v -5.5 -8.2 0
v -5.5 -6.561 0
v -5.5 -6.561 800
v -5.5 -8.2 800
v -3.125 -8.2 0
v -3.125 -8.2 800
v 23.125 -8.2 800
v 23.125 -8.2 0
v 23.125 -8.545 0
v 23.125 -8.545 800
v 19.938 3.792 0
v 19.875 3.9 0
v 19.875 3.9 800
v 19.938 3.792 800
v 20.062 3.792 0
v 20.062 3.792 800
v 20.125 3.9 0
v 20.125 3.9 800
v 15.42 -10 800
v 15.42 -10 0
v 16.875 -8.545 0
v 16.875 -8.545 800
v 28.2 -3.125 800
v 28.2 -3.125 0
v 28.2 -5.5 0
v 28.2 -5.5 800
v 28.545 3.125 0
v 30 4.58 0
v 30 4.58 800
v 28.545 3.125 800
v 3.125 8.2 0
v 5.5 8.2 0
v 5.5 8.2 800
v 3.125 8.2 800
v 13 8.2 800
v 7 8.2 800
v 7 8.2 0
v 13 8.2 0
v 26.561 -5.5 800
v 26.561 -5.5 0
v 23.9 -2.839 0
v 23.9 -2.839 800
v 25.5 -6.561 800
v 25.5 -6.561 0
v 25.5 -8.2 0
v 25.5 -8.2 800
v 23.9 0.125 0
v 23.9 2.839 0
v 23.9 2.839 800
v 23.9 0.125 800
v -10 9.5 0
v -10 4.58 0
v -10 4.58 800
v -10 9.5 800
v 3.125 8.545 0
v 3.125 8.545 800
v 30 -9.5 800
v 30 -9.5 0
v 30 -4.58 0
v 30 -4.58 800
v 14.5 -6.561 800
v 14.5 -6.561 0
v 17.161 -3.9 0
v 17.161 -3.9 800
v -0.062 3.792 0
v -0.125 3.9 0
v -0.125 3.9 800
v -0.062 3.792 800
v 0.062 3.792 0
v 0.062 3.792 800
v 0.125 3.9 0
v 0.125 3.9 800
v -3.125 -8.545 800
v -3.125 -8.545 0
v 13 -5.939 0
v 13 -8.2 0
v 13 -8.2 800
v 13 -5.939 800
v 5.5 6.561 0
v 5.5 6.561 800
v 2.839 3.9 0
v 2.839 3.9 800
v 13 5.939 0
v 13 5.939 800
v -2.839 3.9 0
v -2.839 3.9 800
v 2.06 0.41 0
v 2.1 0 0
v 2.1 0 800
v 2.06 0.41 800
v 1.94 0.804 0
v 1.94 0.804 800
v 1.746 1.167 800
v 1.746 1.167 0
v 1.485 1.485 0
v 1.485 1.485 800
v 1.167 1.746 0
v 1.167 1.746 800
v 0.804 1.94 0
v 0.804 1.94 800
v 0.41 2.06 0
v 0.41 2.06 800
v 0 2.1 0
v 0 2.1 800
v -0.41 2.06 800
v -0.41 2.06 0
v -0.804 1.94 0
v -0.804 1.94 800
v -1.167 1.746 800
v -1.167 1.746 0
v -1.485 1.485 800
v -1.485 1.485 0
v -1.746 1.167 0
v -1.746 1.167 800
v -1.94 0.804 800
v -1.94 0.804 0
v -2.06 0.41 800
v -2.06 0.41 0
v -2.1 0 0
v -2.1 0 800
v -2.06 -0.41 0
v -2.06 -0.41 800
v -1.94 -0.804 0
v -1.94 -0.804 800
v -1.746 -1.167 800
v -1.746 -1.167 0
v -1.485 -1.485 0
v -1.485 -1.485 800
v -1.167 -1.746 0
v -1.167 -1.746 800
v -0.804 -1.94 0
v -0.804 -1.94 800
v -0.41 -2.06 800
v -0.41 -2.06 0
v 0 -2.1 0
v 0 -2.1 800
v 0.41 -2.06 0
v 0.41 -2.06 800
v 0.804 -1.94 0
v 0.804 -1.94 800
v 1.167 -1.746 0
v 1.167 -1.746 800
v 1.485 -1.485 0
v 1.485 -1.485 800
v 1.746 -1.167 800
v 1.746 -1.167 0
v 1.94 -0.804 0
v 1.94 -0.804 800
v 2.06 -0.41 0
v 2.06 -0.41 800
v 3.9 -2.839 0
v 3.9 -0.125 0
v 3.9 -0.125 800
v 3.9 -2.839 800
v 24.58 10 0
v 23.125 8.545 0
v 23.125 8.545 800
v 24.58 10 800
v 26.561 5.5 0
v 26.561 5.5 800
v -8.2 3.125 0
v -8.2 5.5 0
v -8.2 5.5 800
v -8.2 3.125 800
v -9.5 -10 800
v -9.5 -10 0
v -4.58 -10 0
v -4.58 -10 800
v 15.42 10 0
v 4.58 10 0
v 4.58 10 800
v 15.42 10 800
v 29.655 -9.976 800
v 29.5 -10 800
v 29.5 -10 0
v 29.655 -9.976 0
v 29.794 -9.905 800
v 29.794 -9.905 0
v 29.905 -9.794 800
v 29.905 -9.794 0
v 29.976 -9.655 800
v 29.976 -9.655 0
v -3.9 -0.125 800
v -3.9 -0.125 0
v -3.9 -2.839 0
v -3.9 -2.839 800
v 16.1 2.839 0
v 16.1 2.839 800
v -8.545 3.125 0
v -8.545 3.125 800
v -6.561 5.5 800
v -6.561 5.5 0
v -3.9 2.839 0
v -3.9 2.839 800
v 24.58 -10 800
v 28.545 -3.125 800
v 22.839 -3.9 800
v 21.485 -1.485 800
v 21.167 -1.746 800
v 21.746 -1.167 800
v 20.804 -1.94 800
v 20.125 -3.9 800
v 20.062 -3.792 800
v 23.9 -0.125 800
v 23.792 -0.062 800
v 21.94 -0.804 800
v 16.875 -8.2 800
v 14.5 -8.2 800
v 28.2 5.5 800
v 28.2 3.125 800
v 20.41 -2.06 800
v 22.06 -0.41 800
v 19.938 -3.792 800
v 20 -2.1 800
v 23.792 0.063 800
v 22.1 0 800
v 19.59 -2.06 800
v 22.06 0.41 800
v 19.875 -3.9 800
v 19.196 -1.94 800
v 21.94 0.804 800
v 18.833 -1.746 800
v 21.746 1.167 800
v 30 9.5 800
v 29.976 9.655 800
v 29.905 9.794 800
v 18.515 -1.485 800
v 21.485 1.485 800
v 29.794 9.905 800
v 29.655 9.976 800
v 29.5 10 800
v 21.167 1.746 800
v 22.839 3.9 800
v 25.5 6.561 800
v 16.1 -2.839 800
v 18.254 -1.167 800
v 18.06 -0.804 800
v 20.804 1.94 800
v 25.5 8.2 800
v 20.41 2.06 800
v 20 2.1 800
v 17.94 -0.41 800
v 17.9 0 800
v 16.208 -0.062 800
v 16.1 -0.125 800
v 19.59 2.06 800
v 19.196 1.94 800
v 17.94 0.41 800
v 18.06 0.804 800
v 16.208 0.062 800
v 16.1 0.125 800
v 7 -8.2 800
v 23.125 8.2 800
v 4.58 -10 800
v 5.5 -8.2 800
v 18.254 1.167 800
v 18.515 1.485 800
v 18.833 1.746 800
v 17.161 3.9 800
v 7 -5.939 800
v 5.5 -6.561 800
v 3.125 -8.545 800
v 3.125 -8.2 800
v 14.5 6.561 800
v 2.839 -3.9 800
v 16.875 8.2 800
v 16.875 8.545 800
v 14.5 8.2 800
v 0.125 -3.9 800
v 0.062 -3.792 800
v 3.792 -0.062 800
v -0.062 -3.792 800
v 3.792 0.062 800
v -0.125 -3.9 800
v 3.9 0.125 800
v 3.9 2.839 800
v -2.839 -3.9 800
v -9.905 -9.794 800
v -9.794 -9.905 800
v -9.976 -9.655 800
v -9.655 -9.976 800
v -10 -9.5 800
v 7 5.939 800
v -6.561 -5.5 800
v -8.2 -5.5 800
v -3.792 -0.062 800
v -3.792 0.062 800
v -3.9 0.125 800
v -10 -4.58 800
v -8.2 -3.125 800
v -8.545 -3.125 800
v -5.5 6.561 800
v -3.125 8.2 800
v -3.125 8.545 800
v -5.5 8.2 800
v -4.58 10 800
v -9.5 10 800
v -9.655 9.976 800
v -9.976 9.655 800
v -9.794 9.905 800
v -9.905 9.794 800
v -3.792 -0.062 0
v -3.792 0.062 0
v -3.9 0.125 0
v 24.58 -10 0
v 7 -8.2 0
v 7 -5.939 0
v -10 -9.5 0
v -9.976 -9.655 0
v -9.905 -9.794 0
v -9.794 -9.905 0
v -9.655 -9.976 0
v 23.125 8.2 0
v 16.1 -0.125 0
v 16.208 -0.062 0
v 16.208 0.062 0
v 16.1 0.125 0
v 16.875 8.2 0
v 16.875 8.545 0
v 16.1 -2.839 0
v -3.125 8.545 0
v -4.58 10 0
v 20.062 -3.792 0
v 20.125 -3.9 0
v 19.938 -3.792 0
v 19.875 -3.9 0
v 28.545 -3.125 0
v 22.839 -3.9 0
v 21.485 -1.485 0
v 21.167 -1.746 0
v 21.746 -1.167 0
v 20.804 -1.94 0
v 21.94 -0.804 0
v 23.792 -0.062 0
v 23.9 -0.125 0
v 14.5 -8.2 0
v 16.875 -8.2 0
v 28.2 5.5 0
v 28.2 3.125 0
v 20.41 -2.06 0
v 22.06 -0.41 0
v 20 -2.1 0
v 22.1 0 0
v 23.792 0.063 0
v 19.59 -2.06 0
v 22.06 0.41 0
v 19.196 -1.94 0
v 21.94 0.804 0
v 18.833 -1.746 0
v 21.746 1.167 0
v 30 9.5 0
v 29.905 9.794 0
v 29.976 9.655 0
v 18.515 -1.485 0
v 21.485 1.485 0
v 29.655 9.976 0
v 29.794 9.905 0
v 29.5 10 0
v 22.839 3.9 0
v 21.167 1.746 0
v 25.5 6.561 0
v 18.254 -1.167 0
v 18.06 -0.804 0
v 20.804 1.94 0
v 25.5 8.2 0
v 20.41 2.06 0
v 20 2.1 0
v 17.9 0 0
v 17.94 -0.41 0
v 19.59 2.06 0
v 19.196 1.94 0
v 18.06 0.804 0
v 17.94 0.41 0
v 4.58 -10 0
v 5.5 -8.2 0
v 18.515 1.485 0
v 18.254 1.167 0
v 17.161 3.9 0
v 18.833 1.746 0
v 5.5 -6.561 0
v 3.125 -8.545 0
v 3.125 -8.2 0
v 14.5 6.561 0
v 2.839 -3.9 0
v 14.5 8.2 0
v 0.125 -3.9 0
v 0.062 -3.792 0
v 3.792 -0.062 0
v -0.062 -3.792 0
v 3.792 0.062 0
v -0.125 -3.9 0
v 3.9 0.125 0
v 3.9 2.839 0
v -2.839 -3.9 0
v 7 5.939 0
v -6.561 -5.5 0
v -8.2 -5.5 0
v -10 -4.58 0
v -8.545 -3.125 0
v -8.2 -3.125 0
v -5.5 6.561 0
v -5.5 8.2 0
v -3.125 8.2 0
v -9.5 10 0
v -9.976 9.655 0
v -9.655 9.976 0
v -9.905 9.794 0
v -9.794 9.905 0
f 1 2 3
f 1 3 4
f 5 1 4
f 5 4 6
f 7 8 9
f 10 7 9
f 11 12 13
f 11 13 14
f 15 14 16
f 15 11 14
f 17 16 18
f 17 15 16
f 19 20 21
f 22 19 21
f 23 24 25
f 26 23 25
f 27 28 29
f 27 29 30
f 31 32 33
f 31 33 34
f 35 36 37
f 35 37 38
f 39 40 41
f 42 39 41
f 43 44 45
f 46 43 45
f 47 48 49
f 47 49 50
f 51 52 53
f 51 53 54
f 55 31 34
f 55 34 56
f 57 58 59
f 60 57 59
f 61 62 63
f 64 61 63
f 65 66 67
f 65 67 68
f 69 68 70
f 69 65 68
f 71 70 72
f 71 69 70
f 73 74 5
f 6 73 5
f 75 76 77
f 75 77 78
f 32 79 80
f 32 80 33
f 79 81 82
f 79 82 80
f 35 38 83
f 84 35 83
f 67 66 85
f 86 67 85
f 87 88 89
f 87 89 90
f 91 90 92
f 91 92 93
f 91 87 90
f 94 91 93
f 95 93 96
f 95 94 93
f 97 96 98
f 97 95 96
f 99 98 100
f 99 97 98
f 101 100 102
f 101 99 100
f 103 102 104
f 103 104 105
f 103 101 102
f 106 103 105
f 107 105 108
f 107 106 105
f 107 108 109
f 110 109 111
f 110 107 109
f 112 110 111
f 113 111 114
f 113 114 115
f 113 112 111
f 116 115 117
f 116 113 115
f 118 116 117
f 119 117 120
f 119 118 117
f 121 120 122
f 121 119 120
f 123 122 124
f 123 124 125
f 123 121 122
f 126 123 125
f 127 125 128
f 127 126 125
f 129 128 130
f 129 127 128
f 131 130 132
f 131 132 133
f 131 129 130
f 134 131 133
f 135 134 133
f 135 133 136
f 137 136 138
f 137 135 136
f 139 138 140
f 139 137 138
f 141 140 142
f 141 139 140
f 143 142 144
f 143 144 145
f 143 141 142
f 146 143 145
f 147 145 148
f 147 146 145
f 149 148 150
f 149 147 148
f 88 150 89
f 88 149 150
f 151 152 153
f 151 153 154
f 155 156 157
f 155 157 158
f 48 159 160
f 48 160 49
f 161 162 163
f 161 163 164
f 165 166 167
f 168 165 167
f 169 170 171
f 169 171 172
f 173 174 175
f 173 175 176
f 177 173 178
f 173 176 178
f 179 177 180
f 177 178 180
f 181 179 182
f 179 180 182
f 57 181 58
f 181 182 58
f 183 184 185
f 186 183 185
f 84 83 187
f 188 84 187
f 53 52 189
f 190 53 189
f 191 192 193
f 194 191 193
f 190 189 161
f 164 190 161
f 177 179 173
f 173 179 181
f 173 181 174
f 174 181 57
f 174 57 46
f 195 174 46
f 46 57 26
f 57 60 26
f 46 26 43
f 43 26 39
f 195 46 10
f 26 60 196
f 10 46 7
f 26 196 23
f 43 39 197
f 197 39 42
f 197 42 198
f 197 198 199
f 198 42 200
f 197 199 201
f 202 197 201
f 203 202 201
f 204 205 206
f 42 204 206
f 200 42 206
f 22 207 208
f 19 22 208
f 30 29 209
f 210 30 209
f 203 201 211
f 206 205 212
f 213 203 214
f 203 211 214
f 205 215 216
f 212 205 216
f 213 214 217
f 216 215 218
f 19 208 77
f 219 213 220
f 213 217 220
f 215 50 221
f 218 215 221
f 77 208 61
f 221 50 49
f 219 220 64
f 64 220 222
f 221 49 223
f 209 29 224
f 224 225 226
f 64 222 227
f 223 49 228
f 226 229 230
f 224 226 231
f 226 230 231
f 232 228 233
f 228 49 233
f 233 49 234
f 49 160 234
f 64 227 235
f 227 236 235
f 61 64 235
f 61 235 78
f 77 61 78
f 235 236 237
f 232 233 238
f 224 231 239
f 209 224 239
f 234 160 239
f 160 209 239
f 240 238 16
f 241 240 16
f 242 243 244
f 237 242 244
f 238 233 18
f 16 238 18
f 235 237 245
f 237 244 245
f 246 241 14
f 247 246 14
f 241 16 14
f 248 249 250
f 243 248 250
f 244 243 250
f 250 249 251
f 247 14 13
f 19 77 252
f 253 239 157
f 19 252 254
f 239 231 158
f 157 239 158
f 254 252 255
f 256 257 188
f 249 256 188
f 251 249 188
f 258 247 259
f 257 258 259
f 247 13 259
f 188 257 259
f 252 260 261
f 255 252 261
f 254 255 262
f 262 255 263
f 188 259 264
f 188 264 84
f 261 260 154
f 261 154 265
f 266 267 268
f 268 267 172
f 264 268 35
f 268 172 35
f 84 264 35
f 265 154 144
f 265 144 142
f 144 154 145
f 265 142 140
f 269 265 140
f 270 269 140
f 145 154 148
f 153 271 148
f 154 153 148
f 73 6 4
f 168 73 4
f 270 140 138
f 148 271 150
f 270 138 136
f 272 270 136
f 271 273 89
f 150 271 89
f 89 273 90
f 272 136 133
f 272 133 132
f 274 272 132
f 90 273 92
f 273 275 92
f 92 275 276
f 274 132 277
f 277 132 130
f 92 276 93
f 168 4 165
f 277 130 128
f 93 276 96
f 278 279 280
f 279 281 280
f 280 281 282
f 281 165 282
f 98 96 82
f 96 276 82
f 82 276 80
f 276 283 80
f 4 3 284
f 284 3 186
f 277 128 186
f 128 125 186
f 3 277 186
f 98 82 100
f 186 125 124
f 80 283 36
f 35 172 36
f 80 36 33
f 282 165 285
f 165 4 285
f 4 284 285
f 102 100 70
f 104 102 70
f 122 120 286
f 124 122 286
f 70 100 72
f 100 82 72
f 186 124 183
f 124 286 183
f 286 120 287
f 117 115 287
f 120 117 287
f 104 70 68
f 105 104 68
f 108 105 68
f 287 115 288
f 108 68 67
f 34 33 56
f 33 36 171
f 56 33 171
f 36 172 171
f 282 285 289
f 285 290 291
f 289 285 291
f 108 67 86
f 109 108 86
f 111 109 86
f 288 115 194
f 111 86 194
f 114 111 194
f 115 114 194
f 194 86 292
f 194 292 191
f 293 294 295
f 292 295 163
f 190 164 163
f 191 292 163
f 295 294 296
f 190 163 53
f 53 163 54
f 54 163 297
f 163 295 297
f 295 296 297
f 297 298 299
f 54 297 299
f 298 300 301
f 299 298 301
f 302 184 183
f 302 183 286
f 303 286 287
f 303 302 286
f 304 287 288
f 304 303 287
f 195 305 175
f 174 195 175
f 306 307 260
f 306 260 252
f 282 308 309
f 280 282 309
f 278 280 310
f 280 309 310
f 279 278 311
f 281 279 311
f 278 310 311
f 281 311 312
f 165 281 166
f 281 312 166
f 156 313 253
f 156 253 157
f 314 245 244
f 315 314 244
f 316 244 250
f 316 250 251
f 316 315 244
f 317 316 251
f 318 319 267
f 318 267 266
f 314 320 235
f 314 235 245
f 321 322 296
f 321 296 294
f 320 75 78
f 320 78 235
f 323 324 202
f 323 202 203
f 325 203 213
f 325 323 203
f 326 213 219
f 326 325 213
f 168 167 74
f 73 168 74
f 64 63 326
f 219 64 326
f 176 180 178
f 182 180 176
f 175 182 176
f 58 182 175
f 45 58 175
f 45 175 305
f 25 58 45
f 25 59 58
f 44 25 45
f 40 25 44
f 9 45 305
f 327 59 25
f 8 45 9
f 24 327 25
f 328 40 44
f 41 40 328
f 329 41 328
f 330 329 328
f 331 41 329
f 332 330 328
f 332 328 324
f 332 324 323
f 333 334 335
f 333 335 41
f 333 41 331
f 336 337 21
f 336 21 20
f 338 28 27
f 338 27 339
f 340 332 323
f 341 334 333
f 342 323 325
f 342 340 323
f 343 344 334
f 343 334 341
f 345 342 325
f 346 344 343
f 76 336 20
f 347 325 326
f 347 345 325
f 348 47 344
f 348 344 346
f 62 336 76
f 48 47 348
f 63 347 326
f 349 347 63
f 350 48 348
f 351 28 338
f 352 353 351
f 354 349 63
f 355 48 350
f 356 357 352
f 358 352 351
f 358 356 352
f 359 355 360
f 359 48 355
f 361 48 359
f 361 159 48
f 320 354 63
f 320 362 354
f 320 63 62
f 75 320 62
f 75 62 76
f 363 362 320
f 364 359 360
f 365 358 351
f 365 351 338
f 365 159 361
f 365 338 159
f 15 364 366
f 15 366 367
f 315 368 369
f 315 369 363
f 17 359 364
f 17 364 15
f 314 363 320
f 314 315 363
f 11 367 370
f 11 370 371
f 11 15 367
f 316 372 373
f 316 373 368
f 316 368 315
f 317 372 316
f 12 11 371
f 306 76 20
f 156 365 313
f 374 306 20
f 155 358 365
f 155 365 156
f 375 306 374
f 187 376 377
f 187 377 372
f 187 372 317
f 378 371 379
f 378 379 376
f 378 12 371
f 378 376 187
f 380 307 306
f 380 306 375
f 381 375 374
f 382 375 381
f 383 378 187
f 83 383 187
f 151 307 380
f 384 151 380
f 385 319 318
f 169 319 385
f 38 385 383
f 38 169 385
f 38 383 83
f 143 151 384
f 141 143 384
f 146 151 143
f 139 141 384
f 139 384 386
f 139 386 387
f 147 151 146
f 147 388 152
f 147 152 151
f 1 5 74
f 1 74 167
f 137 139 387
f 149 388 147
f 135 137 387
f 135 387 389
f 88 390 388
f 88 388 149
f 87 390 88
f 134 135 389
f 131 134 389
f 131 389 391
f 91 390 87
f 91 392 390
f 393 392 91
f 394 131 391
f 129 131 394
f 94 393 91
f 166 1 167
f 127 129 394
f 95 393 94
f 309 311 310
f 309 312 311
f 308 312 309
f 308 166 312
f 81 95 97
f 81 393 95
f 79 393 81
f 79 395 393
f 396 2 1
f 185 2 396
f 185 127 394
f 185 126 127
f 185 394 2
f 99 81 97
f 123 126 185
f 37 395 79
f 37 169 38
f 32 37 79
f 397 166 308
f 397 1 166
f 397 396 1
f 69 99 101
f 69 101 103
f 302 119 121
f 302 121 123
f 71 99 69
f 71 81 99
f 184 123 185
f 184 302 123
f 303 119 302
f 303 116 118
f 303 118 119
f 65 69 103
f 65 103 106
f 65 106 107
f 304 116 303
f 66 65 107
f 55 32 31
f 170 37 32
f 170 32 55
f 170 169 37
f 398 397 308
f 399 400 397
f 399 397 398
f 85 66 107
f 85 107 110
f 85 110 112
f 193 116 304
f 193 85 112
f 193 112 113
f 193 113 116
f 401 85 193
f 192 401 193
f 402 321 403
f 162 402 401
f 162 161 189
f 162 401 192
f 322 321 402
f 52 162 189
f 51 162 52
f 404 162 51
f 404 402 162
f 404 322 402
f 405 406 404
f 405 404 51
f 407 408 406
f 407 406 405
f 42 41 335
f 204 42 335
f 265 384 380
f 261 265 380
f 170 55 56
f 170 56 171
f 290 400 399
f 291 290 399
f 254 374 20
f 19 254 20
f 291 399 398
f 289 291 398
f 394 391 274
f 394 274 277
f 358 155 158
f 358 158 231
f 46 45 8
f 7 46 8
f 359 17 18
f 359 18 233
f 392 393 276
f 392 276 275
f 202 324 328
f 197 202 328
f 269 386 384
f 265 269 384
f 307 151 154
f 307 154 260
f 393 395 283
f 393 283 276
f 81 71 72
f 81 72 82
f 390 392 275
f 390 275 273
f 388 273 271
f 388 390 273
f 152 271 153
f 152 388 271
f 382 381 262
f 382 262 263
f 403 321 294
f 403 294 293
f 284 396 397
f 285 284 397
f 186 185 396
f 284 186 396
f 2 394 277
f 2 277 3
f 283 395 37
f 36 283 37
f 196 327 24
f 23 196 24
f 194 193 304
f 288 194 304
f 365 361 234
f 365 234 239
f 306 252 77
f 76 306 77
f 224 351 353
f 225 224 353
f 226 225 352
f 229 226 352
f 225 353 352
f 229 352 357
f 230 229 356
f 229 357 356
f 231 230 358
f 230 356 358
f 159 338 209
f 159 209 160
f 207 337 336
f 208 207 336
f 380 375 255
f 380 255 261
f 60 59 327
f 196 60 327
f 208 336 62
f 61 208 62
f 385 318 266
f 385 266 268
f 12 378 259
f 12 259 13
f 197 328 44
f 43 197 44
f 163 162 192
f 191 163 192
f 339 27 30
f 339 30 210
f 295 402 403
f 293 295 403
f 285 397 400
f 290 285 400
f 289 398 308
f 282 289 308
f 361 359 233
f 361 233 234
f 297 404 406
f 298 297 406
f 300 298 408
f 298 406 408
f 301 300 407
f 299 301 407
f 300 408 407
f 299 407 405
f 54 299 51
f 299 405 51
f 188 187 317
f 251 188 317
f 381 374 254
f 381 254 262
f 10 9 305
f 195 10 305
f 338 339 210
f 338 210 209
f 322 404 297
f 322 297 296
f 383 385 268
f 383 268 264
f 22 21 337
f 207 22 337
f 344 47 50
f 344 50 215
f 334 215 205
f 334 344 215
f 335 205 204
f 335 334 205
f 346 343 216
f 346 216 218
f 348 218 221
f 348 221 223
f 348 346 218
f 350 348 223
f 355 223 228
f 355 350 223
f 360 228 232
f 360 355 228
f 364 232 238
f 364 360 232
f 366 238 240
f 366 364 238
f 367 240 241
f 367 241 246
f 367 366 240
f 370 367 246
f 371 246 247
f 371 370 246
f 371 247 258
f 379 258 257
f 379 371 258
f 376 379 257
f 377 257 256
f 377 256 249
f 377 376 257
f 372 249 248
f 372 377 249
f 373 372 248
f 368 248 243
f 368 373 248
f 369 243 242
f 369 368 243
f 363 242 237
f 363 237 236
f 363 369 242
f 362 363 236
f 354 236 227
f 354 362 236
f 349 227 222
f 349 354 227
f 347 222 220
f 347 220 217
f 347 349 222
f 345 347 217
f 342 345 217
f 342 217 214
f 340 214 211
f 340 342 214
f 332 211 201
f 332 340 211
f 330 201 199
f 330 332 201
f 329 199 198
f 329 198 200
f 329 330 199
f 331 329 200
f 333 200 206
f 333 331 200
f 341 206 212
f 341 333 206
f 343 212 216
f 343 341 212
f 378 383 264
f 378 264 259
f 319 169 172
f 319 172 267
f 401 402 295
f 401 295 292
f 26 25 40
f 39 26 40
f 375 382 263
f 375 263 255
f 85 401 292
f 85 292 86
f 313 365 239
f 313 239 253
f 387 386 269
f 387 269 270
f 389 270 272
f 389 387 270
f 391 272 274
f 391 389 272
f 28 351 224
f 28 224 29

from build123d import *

# Parameters (mm, degrees)
SKETCH_R  = 2.1
PAD_DEPTH = 800


with BuildPart() as part:
    # Sketch → Pad (new body)
    with BuildSketch(Plane.XY):
        with BuildLine():
            Line((-10, 4.58), (-10, 9.5))
            ThreePointArc((-9.5, 10), (-9.853553, 9.853553), (-10, 9.5))
            Line((-9.5, 10), (-4.58, 10))
            Line((-4.58, 10), (-3.125, 8.545))
            Line((-3.125, 8.545), (-3.125, 8.2))
            Line((-5.5, 8.2), (-3.125, 8.2))
            Line((-5.5, 8.2), (-5.5, 6.56066))
            Line((-5.5, 6.56066), (-2.83934, 3.9))
            Line((-0.125, 3.9), (-2.83934, 3.9))
            ThreePointArc((-0.125, 3.9), (0, 3.775), (0.125, 3.9))
            Line((0.125, 3.9), (2.83934, 3.9))
            Line((2.83934, 3.9), (5.5, 6.56066))
            Line((5.5, 6.56066), (5.5, 8.2))
            Line((5.5, 8.2), (3.125, 8.2))
            Line((3.125, 8.2), (3.125, 8.545))
            Line((3.125, 8.545), (4.58, 10))
            Line((4.58, 10), (15.42, 10))
            Line((15.42, 10), (16.875, 8.545))
            Line((16.875, 8.545), (16.875, 8.2))
            Line((16.875, 8.2), (14.5, 8.2))
            Line((14.5, 8.2), (14.5, 6.56066))
            Line((14.5, 6.56066), (17.16066, 3.9))
            Line((17.16066, 3.9), (19.875, 3.9))
            ThreePointArc((19.875, 3.9), (20, 3.775), (20.125, 3.9))
            Line((20.125, 3.9), (22.83934, 3.9))
            Line((22.83934, 3.9), (25.5, 6.56066))
            Line((25.5, 6.56066), (25.5, 8.2))
            Line((25.5, 8.2), (23.125, 8.2))
            Line((23.125, 8.2), (23.125, 8.545))
            Line((23.125, 8.545), (24.58, 10))
            Line((24.58, 10), (29.5, 10))
            ThreePointArc((30, 9.5), (29.853554, 9.853554), (29.5, 10))
            Line((30, 9.5), (30, 4.58))
            Line((30, 4.58), (28.545, 3.125))
            Line((28.545, 3.125), (28.2, 3.125))
            Line((28.2, 3.125), (28.2, 5.5))
            Line((28.2, 5.5), (26.560661, 5.5))
            Line((26.560661, 5.5), (23.9, 2.83934))
            Line((23.9, 2.83934), (23.9, 0.125))
            ThreePointArc((23.9, 0.125), (23.775, 2e-06), (23.899997, -0.125))
            Line((23.899997, -2.83934), (23.899997, -0.125))
            Line((26.560658, -5.5), (23.899997, -2.83934))
            Line((28.199997, -5.5), (26.560658, -5.5))
            Line((28.199997, -3.125), (28.199997, -5.5))
            Line((28.544997, -3.125), (28.199997, -3.125))
            Line((29.999997, -4.58), (28.544997, -3.125))
            Line((29.999997, -9.5), (29.999997, -4.58))
            ThreePointArc((29.5, -10), (29.853552, -9.853552), (29.999997, -9.5))
            Line((24.58, -10), (29.5, -10))
            Line((23.125, -8.545), (24.58, -10))
            Line((23.125, -8.2), (23.125, -8.545))
            Line((25.5, -8.2), (23.125, -8.2))
            Line((25.5, -6.56066), (25.5, -8.2))
            Line((22.83934, -3.9), (25.5, -6.56066))
            Line((20.125, -3.9), (22.83934, -3.9))
            ThreePointArc((20.125, -3.9), (20, -3.775), (19.875, -3.9))
            Line((17.16066, -3.9), (19.875, -3.9))
            Line((14.5, -6.56066), (17.16066, -3.9))
            Line((14.5, -8.2), (14.5, -6.56066))
            Line((16.875, -8.2), (14.5, -8.2))
            Line((16.875, -8.545), (16.875, -8.2))
            Line((15.42, -10), (16.875, -8.545))
            Line((4.58, -10), (15.42, -10))
            Line((4.58, -10), (3.125, -8.545))
            Line((3.125, -8.545), (3.125, -8.2))
            Line((3.125, -8.2), (5.5, -8.2))
            Line((5.5, -8.2), (5.5, -6.56066))
            Line((2.83934, -3.9), (5.5, -6.56066))
            Line((0.125, -3.9), (2.83934, -3.9))
            ThreePointArc((0.125, -3.9), (0, -3.775), (-0.125, -3.9))
            Line((-0.125, -3.9), (-2.83934, -3.9))
            Line((-2.83934, -3.9), (-5.5, -6.56066))
            Line((-5.5, -6.56066), (-5.5, -8.2))
            Line((-5.5, -8.2), (-3.125, -8.2))
            Line((-3.125, -8.545), (-3.125, -8.2))
            Line((-4.58, -10), (-3.125, -8.545))
            Line((-9.5, -10), (-4.58, -10))
            ThreePointArc((-10, -9.5), (-9.853553, -9.853553), (-9.5, -10))
            Line((-10, -4.58), (-10, -9.5))
            Line((-8.545, -3.125), (-10, -4.58))
            Line((-8.2, -3.125), (-8.545, -3.125))
            Line((-8.2, -5.5), (-8.2, -3.125))
            Line((-6.56066, -5.5), (-8.2, -5.5))
            Line((-3.9, -2.83934), (-6.56066, -5.5))
            Line((-3.9, -0.125), (-3.9, -2.83934))
            ThreePointArc((-3.9, -0.125), (-3.775, 0), (-3.9, 0.125))
            Line((-3.9, 2.83934), (-3.9, 0.125))
            Line((-6.56066, 5.5), (-3.9, 2.83934))
            Line((-8.2, 5.5), (-6.56066, 5.5))
            Line((-8.2, 5.5), (-8.2, 3.125))
            Line((-8.545, 3.125), (-8.2, 3.125))
            Line((-10, 4.58), (-8.545, 3.125))
        make_face()
        Circle(SKETCH_R, mode=Mode.SUBTRACT)
        with Locations((20, 0)):
            Circle(SKETCH_R, mode=Mode.SUBTRACT)
        with BuildLine():
            Line((7, 5.93934), (3.9, 2.83934))
            Line((3.9, 2.83934), (3.9, 0.125))
            ThreePointArc((3.9, 0.125), (3.775, 0), (3.9, -0.125))
            Line((3.9, -0.125), (3.9, -2.83934))
            Line((3.9, -2.83934), (7, -5.93934))
            Line((7, -5.93934), (7, -8.2))
            Line((7, -8.2), (13, -8.2))
            Line((13, -8.2), (13, -5.93934))
            Line((13, -5.93934), (16.1, -2.83934))
            Line((16.1, -2.83934), (16.1, -0.125))
            ThreePointArc((16.1, -0.125), (16.224999, 0), (16.1, 0.125))
            Line((16.1, 2.83934), (16.1, 0.125))
            Line((13, 5.93934), (16.1, 2.83934))
            Line((13, 8.2), (13, 5.93934))
            Line((7, 8.2), (13, 8.2))
            Line((7, 5.93934), (7, 8.2))
        make_face(mode=Mode.SUBTRACT)
    extrude(amount=PAD_DEPTH)


solid = part.part
